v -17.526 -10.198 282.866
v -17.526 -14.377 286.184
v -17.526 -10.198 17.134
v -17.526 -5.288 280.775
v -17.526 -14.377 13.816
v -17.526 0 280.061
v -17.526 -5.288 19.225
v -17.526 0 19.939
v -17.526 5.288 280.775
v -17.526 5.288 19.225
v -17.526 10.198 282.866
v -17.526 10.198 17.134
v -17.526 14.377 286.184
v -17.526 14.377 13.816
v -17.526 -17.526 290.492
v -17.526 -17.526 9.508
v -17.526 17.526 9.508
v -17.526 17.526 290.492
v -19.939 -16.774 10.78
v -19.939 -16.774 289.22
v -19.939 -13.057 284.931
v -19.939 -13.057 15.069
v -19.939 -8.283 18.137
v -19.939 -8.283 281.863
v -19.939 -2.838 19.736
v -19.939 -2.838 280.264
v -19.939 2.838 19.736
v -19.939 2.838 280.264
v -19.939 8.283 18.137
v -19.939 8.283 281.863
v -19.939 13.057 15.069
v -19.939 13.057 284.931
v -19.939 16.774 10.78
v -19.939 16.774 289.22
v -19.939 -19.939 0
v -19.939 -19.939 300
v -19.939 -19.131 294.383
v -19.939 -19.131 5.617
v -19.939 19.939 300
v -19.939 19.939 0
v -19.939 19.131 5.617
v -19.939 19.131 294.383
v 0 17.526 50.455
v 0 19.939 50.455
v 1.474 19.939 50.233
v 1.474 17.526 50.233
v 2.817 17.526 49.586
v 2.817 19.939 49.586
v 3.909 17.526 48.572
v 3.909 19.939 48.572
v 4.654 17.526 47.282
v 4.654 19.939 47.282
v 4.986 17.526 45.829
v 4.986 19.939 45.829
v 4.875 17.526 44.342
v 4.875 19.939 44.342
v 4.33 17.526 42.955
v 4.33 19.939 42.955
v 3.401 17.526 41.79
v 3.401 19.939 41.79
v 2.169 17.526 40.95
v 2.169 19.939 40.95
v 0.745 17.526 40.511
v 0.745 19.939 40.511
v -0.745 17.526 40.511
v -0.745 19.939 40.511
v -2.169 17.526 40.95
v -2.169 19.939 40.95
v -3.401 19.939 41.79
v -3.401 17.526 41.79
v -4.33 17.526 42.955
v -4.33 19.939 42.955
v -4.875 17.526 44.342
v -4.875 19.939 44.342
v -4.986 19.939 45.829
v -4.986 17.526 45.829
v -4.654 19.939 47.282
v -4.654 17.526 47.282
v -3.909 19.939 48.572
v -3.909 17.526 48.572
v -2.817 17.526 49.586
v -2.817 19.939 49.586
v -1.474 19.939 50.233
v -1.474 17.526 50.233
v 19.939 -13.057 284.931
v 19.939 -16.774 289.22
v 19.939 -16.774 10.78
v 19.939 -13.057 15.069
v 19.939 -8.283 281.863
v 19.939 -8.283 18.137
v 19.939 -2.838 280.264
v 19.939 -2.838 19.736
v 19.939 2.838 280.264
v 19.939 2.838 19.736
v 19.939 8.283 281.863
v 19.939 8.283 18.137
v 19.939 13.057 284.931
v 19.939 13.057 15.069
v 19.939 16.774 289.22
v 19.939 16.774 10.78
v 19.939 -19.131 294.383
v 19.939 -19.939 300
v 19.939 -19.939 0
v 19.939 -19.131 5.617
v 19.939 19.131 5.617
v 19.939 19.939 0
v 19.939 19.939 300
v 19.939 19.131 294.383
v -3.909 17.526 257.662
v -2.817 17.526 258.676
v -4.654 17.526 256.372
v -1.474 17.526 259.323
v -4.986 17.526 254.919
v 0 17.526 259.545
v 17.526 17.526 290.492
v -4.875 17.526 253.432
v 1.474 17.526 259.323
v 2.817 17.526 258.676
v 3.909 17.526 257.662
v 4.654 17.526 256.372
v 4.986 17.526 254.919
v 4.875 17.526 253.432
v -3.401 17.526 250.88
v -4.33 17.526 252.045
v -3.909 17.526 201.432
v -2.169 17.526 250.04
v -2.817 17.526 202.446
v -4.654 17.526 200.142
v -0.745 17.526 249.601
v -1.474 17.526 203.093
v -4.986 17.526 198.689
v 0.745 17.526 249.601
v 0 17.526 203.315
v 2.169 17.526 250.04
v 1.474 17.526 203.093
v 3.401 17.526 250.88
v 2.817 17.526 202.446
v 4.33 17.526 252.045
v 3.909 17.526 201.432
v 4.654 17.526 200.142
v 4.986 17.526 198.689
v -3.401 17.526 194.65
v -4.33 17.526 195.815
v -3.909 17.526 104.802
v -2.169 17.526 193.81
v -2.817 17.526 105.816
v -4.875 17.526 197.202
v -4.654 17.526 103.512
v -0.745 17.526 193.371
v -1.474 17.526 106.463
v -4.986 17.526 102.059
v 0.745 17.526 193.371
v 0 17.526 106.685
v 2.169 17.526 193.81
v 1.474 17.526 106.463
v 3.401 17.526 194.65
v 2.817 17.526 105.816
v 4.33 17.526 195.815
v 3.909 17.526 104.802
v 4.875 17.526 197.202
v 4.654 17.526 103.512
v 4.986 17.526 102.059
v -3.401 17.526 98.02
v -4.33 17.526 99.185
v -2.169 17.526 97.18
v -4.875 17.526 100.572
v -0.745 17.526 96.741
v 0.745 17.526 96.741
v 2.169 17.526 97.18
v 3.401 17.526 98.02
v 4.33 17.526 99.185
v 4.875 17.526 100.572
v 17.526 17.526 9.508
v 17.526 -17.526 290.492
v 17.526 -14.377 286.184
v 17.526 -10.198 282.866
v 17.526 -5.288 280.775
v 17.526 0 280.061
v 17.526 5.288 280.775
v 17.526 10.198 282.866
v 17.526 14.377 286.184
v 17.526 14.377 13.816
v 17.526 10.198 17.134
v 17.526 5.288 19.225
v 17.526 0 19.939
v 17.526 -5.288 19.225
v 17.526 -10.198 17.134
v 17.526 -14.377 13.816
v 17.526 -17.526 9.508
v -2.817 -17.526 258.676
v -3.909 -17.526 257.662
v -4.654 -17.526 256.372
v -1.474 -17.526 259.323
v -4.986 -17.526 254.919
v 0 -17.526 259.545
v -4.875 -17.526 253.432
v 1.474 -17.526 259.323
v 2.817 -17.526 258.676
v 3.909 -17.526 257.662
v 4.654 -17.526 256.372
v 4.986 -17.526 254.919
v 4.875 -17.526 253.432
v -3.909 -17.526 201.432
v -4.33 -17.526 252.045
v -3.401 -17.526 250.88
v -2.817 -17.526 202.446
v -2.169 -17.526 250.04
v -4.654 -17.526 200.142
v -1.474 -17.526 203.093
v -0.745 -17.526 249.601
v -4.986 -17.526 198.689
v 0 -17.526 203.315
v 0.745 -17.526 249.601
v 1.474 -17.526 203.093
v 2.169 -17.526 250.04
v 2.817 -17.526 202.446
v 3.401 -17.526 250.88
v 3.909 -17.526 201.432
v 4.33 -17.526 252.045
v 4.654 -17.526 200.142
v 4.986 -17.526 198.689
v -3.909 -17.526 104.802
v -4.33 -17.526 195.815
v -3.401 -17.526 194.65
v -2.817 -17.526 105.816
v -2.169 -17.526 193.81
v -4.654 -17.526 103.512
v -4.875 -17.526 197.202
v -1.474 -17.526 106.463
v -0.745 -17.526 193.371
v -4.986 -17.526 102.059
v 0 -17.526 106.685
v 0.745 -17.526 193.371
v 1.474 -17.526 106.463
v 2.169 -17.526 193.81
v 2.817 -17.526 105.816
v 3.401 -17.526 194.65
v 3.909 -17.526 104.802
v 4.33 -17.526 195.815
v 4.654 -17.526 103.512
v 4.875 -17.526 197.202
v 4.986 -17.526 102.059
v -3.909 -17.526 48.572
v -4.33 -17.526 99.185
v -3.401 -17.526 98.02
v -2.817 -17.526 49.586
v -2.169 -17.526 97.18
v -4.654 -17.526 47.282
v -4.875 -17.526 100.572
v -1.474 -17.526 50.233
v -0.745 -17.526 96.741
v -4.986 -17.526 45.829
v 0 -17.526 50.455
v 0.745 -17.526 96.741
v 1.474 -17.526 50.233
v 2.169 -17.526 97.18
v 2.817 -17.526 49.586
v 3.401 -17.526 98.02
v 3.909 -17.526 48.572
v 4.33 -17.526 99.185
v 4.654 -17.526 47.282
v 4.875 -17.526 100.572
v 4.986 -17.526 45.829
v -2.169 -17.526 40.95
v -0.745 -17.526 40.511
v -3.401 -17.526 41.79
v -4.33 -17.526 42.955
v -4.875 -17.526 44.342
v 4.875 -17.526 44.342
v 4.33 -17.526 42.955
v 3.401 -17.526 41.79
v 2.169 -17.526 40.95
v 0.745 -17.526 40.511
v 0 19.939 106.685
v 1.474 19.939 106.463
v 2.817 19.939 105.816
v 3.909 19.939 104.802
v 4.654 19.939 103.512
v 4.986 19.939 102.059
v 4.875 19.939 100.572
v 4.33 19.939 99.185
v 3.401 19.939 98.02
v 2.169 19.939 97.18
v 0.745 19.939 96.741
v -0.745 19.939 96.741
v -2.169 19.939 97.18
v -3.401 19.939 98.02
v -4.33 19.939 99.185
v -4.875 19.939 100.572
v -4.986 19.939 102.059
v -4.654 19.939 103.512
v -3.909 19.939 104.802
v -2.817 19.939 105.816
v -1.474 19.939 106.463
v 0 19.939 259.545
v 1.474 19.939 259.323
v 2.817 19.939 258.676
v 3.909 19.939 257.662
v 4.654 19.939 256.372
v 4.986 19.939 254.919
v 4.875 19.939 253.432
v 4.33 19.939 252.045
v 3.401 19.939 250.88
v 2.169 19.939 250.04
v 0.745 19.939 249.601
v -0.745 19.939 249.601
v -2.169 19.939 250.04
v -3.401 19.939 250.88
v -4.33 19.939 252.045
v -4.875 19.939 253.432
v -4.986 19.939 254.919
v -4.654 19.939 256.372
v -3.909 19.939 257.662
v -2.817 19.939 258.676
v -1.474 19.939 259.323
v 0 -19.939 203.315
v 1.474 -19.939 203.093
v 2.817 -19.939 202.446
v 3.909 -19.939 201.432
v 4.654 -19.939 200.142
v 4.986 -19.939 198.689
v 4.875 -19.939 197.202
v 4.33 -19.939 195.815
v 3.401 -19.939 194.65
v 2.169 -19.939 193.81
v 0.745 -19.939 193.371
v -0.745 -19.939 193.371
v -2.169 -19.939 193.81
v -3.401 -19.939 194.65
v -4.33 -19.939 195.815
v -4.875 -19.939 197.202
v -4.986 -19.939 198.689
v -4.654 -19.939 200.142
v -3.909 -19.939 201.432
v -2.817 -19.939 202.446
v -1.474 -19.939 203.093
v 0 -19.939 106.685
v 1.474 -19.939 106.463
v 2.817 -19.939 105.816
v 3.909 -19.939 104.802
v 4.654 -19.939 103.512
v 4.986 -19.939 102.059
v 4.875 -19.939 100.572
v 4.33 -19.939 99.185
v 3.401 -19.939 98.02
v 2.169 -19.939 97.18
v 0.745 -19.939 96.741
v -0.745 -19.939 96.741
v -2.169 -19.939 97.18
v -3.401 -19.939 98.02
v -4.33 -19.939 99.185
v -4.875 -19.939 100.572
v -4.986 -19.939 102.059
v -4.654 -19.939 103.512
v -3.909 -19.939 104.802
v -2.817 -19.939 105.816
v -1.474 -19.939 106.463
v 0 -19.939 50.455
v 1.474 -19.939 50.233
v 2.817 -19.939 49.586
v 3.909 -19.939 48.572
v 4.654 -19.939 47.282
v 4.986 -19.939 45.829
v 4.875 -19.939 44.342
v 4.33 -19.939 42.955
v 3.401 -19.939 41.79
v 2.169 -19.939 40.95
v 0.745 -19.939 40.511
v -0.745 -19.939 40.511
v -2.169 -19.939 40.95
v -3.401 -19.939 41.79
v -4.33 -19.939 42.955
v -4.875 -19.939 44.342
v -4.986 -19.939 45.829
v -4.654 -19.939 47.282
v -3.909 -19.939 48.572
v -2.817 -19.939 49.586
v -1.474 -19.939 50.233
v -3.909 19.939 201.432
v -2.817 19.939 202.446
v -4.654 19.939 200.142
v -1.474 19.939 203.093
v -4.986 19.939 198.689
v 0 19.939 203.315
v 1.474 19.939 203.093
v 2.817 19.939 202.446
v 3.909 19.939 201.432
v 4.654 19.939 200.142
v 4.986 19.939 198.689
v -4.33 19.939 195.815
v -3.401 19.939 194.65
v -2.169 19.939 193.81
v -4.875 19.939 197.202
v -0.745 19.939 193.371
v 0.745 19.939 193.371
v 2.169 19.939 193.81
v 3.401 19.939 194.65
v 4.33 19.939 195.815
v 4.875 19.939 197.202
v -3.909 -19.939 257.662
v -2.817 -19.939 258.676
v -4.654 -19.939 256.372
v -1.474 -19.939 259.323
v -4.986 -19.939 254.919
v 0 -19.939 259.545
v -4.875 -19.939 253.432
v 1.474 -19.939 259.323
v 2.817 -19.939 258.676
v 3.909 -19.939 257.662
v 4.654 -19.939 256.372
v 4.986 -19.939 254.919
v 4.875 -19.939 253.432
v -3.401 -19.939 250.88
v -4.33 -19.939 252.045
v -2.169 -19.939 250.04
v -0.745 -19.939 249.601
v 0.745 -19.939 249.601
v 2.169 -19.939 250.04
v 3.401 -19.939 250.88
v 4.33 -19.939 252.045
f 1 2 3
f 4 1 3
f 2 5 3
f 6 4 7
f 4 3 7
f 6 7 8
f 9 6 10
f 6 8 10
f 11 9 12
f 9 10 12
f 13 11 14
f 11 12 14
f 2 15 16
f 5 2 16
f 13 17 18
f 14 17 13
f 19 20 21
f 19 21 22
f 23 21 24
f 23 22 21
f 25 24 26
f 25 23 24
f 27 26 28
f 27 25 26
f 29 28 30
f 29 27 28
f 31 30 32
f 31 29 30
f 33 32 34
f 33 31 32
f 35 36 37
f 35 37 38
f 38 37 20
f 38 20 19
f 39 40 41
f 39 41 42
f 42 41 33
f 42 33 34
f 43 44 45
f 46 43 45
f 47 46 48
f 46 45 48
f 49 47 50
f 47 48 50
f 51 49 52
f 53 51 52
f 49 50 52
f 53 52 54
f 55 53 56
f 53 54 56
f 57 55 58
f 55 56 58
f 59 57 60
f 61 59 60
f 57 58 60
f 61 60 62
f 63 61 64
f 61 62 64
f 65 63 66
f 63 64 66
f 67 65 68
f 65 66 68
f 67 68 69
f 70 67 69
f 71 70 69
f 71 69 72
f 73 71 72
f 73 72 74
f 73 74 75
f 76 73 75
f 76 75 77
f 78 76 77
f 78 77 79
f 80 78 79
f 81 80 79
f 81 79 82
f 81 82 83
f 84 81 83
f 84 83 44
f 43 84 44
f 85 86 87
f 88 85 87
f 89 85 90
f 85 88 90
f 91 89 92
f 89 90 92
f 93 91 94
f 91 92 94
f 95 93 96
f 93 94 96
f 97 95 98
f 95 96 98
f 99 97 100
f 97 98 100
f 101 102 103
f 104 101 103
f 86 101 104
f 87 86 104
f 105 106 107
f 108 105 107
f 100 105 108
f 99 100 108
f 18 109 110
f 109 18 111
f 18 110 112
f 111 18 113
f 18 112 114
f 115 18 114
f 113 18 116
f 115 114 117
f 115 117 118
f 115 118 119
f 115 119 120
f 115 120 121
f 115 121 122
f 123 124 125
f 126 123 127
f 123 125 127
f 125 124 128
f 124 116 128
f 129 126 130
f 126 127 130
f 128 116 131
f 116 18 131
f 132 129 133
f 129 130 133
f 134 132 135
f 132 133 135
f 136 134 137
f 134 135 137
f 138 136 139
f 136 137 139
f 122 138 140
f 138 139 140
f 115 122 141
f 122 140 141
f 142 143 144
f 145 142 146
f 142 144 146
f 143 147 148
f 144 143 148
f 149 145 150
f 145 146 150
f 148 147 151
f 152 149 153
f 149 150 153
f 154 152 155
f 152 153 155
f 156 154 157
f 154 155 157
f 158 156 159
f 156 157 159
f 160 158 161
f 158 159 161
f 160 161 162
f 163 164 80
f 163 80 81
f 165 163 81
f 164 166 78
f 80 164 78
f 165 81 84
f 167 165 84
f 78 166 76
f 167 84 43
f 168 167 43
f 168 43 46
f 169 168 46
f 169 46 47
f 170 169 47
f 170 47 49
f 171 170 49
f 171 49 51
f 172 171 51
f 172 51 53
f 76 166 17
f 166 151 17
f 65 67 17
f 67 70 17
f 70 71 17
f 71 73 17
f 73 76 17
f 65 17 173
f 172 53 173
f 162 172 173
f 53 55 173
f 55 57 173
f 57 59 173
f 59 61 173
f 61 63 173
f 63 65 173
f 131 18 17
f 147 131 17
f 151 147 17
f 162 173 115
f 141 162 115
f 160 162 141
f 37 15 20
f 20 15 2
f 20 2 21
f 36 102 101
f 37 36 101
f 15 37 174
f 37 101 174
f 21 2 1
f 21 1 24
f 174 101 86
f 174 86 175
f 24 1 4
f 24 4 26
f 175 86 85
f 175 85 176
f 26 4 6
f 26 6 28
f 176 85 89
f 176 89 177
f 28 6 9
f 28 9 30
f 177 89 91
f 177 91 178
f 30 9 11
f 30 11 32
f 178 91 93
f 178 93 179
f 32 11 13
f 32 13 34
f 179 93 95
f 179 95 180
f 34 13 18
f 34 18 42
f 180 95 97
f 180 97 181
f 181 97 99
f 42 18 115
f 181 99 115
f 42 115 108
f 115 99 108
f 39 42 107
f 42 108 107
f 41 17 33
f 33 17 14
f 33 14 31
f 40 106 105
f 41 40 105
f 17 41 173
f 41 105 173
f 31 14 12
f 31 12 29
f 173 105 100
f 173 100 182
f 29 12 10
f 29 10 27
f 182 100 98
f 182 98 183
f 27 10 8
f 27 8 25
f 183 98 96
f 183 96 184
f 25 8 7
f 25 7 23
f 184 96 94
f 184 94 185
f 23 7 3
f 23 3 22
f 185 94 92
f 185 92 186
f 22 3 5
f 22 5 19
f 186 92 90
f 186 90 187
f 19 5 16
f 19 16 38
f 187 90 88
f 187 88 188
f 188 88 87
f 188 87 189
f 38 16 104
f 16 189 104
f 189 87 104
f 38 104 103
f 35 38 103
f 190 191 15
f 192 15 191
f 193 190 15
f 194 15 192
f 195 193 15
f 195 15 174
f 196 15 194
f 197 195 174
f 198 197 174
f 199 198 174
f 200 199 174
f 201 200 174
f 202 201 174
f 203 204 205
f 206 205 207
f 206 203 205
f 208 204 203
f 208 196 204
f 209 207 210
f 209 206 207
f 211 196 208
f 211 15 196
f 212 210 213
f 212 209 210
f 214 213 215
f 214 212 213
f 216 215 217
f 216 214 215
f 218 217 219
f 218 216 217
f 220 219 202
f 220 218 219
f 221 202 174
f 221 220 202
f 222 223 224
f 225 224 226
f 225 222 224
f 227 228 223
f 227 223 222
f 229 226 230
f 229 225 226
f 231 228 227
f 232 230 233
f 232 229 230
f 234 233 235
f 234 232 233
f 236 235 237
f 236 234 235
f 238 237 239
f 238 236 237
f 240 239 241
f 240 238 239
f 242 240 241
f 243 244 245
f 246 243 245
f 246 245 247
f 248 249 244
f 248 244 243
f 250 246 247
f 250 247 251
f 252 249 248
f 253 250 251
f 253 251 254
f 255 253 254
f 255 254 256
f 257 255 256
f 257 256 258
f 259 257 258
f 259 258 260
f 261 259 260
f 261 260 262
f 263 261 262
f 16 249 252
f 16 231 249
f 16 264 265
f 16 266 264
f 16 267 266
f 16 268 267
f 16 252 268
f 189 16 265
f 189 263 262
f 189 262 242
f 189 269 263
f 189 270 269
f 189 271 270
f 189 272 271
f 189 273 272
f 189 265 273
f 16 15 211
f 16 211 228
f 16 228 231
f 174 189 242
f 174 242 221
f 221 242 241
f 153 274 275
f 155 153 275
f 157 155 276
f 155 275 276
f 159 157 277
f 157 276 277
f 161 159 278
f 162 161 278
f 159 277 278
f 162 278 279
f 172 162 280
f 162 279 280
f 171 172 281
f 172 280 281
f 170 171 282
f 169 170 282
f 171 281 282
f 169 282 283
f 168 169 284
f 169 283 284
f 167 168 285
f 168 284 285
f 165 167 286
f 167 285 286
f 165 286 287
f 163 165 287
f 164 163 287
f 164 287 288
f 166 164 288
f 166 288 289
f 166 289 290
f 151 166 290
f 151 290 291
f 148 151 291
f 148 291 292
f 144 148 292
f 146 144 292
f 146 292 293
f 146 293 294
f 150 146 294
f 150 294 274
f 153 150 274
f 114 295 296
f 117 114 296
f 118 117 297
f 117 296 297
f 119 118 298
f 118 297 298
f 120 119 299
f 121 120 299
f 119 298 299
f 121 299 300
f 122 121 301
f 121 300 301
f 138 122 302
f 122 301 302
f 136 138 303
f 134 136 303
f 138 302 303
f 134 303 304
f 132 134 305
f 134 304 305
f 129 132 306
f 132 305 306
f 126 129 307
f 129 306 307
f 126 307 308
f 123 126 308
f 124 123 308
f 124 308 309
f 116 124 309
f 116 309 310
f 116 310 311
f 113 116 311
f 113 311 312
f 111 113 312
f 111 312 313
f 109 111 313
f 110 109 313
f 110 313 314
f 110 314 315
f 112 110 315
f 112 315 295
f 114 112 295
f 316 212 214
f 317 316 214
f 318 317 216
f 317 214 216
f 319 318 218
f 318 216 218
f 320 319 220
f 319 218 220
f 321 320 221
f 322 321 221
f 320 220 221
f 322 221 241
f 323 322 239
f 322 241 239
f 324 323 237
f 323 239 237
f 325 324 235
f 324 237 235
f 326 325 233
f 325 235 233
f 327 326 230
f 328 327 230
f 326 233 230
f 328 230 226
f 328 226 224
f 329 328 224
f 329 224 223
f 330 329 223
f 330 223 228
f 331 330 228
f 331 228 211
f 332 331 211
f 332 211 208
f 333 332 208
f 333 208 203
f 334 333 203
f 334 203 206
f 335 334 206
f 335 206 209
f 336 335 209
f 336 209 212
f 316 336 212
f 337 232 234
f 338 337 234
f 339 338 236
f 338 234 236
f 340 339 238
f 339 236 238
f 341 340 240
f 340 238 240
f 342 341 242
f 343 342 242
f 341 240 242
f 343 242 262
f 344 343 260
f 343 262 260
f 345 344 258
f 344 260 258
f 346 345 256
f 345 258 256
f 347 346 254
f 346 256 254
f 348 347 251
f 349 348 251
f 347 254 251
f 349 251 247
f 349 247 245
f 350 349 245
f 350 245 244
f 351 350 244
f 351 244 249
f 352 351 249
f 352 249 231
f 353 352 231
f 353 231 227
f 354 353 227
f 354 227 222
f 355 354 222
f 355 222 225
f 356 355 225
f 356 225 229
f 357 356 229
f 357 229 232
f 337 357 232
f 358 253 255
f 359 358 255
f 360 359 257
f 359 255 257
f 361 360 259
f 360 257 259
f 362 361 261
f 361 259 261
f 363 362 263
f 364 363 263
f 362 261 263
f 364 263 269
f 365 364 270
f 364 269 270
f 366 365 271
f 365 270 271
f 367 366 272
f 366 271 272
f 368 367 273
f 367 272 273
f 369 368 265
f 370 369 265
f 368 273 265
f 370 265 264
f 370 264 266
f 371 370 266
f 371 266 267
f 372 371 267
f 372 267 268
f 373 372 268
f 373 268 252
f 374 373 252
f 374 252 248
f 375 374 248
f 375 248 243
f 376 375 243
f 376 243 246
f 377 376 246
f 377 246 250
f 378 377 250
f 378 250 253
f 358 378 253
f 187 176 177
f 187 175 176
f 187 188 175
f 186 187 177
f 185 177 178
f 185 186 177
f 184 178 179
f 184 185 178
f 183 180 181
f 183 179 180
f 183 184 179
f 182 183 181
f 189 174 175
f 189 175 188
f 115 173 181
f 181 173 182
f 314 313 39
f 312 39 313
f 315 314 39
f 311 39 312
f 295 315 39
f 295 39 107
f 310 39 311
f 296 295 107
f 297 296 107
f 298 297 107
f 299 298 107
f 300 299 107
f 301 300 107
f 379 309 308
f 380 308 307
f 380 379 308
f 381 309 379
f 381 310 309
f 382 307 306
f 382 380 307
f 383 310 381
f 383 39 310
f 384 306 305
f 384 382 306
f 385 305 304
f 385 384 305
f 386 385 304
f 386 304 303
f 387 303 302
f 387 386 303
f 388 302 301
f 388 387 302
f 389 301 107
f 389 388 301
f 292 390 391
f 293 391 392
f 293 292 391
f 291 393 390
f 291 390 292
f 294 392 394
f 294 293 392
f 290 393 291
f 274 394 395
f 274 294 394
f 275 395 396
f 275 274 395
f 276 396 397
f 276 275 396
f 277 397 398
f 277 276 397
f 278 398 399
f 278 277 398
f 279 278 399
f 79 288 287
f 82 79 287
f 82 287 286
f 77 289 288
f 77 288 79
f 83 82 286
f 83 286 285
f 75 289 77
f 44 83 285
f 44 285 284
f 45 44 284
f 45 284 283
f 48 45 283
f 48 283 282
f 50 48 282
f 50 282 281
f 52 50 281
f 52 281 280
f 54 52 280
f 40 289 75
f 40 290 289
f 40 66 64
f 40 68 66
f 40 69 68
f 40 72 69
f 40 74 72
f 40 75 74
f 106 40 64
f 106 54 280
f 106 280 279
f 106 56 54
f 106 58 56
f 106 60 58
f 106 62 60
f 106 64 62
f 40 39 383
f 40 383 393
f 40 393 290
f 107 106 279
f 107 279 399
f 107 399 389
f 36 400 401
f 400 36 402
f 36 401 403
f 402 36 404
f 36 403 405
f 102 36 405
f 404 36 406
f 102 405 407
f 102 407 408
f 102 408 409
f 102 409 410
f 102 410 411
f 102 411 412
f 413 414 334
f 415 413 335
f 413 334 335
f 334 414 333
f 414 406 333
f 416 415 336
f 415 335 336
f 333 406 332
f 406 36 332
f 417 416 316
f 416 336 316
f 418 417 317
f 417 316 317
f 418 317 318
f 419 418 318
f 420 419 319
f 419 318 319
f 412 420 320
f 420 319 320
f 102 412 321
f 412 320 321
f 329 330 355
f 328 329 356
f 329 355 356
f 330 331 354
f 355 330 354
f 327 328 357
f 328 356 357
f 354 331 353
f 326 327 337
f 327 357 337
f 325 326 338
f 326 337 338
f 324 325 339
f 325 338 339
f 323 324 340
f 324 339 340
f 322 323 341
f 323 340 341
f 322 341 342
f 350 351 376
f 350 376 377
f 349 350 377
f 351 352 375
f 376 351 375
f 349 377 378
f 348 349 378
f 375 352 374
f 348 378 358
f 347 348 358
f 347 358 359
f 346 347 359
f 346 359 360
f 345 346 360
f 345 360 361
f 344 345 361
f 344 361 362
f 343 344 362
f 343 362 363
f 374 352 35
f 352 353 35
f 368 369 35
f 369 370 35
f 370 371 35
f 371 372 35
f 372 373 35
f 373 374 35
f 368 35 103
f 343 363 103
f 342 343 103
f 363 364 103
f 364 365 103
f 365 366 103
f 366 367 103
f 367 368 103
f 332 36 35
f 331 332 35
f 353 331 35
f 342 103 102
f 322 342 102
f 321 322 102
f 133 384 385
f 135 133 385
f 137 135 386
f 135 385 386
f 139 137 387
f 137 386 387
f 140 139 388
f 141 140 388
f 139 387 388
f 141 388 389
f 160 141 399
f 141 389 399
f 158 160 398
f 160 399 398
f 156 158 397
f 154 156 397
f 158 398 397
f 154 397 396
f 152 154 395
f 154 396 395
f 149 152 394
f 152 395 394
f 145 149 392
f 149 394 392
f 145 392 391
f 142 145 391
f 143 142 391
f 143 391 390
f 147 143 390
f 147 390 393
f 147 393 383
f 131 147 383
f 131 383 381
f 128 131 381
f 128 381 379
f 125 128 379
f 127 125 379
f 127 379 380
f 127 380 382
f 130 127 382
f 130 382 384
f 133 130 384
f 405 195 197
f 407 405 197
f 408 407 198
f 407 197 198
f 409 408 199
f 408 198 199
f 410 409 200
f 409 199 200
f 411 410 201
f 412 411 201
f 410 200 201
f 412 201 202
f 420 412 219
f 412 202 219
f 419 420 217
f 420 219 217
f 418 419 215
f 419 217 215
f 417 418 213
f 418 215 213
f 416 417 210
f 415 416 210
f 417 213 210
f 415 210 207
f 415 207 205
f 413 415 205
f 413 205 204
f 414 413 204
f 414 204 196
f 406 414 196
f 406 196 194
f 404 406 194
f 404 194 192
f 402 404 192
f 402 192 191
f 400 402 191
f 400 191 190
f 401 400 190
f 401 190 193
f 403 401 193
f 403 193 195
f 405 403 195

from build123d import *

# Parameters (mm, degrees)
SKETCH1_W           = 39.878
SKETCH1_H           = 39.878
SKETCH1_W_2         = 35.052
SKETCH1_H_2         = 35.052
BOSS_EXTRUDE1_DEPTH = 300
SKETCH2_R           = 19.939
CUT_EXTRUDE1_DEPTH  = 300
SKETCH3_R           = 5
CUT_EXTRUDE2_DEPTH  = 95


with BuildPart() as part:
    # Sketch1 → Boss-Extrude1 (new body)
    with BuildSketch(Plane.XY):
        Rectangle(SKETCH1_W, SKETCH1_H)
        Rectangle(SKETCH1_W_2, SKETCH1_H_2, mode=Mode.SUBTRACT)
    extrude(amount=BOSS_EXTRUDE1_DEPTH)

    # Sketch2 → Cut-Extrude1 (cut)
    with BuildSketch(Plane(origin=(19.939, 0, 0), x_dir=(0, 0, -1), z_dir=(1, 0, 0))):
        with Locations((-300, 0)):
            Circle(SKETCH2_R)
        Circle(SKETCH2_R)
    extrude(amount=-CUT_EXTRUDE1_DEPTH, mode=Mode.SUBTRACT)

    # Sketch3 → Cut-Extrude2 (cut)
    with BuildSketch(Plane(origin=(0, 19.939, 0), x_dir=(1, 0, 0), z_dir=(0, 1, 0))):
        with Locations(Location((0, -198.315, 0), (0, 0, 270))):
            Circle(SKETCH3_R)
        with Locations(Location((0, -254.545, 0), (0, 0, 270))):
            Circle(SKETCH3_R)
        with Locations(Location((0, -101.685, 0), (0, 0, 270))):
            Circle(SKETCH3_R)
        with Locations(Location((0, -45.455, 0), (0, 0, 270))):
            Circle(SKETCH3_R)
    extrude(amount=-CUT_EXTRUDE2_DEPTH, mode=Mode.SUBTRACT)


solid = part.part
